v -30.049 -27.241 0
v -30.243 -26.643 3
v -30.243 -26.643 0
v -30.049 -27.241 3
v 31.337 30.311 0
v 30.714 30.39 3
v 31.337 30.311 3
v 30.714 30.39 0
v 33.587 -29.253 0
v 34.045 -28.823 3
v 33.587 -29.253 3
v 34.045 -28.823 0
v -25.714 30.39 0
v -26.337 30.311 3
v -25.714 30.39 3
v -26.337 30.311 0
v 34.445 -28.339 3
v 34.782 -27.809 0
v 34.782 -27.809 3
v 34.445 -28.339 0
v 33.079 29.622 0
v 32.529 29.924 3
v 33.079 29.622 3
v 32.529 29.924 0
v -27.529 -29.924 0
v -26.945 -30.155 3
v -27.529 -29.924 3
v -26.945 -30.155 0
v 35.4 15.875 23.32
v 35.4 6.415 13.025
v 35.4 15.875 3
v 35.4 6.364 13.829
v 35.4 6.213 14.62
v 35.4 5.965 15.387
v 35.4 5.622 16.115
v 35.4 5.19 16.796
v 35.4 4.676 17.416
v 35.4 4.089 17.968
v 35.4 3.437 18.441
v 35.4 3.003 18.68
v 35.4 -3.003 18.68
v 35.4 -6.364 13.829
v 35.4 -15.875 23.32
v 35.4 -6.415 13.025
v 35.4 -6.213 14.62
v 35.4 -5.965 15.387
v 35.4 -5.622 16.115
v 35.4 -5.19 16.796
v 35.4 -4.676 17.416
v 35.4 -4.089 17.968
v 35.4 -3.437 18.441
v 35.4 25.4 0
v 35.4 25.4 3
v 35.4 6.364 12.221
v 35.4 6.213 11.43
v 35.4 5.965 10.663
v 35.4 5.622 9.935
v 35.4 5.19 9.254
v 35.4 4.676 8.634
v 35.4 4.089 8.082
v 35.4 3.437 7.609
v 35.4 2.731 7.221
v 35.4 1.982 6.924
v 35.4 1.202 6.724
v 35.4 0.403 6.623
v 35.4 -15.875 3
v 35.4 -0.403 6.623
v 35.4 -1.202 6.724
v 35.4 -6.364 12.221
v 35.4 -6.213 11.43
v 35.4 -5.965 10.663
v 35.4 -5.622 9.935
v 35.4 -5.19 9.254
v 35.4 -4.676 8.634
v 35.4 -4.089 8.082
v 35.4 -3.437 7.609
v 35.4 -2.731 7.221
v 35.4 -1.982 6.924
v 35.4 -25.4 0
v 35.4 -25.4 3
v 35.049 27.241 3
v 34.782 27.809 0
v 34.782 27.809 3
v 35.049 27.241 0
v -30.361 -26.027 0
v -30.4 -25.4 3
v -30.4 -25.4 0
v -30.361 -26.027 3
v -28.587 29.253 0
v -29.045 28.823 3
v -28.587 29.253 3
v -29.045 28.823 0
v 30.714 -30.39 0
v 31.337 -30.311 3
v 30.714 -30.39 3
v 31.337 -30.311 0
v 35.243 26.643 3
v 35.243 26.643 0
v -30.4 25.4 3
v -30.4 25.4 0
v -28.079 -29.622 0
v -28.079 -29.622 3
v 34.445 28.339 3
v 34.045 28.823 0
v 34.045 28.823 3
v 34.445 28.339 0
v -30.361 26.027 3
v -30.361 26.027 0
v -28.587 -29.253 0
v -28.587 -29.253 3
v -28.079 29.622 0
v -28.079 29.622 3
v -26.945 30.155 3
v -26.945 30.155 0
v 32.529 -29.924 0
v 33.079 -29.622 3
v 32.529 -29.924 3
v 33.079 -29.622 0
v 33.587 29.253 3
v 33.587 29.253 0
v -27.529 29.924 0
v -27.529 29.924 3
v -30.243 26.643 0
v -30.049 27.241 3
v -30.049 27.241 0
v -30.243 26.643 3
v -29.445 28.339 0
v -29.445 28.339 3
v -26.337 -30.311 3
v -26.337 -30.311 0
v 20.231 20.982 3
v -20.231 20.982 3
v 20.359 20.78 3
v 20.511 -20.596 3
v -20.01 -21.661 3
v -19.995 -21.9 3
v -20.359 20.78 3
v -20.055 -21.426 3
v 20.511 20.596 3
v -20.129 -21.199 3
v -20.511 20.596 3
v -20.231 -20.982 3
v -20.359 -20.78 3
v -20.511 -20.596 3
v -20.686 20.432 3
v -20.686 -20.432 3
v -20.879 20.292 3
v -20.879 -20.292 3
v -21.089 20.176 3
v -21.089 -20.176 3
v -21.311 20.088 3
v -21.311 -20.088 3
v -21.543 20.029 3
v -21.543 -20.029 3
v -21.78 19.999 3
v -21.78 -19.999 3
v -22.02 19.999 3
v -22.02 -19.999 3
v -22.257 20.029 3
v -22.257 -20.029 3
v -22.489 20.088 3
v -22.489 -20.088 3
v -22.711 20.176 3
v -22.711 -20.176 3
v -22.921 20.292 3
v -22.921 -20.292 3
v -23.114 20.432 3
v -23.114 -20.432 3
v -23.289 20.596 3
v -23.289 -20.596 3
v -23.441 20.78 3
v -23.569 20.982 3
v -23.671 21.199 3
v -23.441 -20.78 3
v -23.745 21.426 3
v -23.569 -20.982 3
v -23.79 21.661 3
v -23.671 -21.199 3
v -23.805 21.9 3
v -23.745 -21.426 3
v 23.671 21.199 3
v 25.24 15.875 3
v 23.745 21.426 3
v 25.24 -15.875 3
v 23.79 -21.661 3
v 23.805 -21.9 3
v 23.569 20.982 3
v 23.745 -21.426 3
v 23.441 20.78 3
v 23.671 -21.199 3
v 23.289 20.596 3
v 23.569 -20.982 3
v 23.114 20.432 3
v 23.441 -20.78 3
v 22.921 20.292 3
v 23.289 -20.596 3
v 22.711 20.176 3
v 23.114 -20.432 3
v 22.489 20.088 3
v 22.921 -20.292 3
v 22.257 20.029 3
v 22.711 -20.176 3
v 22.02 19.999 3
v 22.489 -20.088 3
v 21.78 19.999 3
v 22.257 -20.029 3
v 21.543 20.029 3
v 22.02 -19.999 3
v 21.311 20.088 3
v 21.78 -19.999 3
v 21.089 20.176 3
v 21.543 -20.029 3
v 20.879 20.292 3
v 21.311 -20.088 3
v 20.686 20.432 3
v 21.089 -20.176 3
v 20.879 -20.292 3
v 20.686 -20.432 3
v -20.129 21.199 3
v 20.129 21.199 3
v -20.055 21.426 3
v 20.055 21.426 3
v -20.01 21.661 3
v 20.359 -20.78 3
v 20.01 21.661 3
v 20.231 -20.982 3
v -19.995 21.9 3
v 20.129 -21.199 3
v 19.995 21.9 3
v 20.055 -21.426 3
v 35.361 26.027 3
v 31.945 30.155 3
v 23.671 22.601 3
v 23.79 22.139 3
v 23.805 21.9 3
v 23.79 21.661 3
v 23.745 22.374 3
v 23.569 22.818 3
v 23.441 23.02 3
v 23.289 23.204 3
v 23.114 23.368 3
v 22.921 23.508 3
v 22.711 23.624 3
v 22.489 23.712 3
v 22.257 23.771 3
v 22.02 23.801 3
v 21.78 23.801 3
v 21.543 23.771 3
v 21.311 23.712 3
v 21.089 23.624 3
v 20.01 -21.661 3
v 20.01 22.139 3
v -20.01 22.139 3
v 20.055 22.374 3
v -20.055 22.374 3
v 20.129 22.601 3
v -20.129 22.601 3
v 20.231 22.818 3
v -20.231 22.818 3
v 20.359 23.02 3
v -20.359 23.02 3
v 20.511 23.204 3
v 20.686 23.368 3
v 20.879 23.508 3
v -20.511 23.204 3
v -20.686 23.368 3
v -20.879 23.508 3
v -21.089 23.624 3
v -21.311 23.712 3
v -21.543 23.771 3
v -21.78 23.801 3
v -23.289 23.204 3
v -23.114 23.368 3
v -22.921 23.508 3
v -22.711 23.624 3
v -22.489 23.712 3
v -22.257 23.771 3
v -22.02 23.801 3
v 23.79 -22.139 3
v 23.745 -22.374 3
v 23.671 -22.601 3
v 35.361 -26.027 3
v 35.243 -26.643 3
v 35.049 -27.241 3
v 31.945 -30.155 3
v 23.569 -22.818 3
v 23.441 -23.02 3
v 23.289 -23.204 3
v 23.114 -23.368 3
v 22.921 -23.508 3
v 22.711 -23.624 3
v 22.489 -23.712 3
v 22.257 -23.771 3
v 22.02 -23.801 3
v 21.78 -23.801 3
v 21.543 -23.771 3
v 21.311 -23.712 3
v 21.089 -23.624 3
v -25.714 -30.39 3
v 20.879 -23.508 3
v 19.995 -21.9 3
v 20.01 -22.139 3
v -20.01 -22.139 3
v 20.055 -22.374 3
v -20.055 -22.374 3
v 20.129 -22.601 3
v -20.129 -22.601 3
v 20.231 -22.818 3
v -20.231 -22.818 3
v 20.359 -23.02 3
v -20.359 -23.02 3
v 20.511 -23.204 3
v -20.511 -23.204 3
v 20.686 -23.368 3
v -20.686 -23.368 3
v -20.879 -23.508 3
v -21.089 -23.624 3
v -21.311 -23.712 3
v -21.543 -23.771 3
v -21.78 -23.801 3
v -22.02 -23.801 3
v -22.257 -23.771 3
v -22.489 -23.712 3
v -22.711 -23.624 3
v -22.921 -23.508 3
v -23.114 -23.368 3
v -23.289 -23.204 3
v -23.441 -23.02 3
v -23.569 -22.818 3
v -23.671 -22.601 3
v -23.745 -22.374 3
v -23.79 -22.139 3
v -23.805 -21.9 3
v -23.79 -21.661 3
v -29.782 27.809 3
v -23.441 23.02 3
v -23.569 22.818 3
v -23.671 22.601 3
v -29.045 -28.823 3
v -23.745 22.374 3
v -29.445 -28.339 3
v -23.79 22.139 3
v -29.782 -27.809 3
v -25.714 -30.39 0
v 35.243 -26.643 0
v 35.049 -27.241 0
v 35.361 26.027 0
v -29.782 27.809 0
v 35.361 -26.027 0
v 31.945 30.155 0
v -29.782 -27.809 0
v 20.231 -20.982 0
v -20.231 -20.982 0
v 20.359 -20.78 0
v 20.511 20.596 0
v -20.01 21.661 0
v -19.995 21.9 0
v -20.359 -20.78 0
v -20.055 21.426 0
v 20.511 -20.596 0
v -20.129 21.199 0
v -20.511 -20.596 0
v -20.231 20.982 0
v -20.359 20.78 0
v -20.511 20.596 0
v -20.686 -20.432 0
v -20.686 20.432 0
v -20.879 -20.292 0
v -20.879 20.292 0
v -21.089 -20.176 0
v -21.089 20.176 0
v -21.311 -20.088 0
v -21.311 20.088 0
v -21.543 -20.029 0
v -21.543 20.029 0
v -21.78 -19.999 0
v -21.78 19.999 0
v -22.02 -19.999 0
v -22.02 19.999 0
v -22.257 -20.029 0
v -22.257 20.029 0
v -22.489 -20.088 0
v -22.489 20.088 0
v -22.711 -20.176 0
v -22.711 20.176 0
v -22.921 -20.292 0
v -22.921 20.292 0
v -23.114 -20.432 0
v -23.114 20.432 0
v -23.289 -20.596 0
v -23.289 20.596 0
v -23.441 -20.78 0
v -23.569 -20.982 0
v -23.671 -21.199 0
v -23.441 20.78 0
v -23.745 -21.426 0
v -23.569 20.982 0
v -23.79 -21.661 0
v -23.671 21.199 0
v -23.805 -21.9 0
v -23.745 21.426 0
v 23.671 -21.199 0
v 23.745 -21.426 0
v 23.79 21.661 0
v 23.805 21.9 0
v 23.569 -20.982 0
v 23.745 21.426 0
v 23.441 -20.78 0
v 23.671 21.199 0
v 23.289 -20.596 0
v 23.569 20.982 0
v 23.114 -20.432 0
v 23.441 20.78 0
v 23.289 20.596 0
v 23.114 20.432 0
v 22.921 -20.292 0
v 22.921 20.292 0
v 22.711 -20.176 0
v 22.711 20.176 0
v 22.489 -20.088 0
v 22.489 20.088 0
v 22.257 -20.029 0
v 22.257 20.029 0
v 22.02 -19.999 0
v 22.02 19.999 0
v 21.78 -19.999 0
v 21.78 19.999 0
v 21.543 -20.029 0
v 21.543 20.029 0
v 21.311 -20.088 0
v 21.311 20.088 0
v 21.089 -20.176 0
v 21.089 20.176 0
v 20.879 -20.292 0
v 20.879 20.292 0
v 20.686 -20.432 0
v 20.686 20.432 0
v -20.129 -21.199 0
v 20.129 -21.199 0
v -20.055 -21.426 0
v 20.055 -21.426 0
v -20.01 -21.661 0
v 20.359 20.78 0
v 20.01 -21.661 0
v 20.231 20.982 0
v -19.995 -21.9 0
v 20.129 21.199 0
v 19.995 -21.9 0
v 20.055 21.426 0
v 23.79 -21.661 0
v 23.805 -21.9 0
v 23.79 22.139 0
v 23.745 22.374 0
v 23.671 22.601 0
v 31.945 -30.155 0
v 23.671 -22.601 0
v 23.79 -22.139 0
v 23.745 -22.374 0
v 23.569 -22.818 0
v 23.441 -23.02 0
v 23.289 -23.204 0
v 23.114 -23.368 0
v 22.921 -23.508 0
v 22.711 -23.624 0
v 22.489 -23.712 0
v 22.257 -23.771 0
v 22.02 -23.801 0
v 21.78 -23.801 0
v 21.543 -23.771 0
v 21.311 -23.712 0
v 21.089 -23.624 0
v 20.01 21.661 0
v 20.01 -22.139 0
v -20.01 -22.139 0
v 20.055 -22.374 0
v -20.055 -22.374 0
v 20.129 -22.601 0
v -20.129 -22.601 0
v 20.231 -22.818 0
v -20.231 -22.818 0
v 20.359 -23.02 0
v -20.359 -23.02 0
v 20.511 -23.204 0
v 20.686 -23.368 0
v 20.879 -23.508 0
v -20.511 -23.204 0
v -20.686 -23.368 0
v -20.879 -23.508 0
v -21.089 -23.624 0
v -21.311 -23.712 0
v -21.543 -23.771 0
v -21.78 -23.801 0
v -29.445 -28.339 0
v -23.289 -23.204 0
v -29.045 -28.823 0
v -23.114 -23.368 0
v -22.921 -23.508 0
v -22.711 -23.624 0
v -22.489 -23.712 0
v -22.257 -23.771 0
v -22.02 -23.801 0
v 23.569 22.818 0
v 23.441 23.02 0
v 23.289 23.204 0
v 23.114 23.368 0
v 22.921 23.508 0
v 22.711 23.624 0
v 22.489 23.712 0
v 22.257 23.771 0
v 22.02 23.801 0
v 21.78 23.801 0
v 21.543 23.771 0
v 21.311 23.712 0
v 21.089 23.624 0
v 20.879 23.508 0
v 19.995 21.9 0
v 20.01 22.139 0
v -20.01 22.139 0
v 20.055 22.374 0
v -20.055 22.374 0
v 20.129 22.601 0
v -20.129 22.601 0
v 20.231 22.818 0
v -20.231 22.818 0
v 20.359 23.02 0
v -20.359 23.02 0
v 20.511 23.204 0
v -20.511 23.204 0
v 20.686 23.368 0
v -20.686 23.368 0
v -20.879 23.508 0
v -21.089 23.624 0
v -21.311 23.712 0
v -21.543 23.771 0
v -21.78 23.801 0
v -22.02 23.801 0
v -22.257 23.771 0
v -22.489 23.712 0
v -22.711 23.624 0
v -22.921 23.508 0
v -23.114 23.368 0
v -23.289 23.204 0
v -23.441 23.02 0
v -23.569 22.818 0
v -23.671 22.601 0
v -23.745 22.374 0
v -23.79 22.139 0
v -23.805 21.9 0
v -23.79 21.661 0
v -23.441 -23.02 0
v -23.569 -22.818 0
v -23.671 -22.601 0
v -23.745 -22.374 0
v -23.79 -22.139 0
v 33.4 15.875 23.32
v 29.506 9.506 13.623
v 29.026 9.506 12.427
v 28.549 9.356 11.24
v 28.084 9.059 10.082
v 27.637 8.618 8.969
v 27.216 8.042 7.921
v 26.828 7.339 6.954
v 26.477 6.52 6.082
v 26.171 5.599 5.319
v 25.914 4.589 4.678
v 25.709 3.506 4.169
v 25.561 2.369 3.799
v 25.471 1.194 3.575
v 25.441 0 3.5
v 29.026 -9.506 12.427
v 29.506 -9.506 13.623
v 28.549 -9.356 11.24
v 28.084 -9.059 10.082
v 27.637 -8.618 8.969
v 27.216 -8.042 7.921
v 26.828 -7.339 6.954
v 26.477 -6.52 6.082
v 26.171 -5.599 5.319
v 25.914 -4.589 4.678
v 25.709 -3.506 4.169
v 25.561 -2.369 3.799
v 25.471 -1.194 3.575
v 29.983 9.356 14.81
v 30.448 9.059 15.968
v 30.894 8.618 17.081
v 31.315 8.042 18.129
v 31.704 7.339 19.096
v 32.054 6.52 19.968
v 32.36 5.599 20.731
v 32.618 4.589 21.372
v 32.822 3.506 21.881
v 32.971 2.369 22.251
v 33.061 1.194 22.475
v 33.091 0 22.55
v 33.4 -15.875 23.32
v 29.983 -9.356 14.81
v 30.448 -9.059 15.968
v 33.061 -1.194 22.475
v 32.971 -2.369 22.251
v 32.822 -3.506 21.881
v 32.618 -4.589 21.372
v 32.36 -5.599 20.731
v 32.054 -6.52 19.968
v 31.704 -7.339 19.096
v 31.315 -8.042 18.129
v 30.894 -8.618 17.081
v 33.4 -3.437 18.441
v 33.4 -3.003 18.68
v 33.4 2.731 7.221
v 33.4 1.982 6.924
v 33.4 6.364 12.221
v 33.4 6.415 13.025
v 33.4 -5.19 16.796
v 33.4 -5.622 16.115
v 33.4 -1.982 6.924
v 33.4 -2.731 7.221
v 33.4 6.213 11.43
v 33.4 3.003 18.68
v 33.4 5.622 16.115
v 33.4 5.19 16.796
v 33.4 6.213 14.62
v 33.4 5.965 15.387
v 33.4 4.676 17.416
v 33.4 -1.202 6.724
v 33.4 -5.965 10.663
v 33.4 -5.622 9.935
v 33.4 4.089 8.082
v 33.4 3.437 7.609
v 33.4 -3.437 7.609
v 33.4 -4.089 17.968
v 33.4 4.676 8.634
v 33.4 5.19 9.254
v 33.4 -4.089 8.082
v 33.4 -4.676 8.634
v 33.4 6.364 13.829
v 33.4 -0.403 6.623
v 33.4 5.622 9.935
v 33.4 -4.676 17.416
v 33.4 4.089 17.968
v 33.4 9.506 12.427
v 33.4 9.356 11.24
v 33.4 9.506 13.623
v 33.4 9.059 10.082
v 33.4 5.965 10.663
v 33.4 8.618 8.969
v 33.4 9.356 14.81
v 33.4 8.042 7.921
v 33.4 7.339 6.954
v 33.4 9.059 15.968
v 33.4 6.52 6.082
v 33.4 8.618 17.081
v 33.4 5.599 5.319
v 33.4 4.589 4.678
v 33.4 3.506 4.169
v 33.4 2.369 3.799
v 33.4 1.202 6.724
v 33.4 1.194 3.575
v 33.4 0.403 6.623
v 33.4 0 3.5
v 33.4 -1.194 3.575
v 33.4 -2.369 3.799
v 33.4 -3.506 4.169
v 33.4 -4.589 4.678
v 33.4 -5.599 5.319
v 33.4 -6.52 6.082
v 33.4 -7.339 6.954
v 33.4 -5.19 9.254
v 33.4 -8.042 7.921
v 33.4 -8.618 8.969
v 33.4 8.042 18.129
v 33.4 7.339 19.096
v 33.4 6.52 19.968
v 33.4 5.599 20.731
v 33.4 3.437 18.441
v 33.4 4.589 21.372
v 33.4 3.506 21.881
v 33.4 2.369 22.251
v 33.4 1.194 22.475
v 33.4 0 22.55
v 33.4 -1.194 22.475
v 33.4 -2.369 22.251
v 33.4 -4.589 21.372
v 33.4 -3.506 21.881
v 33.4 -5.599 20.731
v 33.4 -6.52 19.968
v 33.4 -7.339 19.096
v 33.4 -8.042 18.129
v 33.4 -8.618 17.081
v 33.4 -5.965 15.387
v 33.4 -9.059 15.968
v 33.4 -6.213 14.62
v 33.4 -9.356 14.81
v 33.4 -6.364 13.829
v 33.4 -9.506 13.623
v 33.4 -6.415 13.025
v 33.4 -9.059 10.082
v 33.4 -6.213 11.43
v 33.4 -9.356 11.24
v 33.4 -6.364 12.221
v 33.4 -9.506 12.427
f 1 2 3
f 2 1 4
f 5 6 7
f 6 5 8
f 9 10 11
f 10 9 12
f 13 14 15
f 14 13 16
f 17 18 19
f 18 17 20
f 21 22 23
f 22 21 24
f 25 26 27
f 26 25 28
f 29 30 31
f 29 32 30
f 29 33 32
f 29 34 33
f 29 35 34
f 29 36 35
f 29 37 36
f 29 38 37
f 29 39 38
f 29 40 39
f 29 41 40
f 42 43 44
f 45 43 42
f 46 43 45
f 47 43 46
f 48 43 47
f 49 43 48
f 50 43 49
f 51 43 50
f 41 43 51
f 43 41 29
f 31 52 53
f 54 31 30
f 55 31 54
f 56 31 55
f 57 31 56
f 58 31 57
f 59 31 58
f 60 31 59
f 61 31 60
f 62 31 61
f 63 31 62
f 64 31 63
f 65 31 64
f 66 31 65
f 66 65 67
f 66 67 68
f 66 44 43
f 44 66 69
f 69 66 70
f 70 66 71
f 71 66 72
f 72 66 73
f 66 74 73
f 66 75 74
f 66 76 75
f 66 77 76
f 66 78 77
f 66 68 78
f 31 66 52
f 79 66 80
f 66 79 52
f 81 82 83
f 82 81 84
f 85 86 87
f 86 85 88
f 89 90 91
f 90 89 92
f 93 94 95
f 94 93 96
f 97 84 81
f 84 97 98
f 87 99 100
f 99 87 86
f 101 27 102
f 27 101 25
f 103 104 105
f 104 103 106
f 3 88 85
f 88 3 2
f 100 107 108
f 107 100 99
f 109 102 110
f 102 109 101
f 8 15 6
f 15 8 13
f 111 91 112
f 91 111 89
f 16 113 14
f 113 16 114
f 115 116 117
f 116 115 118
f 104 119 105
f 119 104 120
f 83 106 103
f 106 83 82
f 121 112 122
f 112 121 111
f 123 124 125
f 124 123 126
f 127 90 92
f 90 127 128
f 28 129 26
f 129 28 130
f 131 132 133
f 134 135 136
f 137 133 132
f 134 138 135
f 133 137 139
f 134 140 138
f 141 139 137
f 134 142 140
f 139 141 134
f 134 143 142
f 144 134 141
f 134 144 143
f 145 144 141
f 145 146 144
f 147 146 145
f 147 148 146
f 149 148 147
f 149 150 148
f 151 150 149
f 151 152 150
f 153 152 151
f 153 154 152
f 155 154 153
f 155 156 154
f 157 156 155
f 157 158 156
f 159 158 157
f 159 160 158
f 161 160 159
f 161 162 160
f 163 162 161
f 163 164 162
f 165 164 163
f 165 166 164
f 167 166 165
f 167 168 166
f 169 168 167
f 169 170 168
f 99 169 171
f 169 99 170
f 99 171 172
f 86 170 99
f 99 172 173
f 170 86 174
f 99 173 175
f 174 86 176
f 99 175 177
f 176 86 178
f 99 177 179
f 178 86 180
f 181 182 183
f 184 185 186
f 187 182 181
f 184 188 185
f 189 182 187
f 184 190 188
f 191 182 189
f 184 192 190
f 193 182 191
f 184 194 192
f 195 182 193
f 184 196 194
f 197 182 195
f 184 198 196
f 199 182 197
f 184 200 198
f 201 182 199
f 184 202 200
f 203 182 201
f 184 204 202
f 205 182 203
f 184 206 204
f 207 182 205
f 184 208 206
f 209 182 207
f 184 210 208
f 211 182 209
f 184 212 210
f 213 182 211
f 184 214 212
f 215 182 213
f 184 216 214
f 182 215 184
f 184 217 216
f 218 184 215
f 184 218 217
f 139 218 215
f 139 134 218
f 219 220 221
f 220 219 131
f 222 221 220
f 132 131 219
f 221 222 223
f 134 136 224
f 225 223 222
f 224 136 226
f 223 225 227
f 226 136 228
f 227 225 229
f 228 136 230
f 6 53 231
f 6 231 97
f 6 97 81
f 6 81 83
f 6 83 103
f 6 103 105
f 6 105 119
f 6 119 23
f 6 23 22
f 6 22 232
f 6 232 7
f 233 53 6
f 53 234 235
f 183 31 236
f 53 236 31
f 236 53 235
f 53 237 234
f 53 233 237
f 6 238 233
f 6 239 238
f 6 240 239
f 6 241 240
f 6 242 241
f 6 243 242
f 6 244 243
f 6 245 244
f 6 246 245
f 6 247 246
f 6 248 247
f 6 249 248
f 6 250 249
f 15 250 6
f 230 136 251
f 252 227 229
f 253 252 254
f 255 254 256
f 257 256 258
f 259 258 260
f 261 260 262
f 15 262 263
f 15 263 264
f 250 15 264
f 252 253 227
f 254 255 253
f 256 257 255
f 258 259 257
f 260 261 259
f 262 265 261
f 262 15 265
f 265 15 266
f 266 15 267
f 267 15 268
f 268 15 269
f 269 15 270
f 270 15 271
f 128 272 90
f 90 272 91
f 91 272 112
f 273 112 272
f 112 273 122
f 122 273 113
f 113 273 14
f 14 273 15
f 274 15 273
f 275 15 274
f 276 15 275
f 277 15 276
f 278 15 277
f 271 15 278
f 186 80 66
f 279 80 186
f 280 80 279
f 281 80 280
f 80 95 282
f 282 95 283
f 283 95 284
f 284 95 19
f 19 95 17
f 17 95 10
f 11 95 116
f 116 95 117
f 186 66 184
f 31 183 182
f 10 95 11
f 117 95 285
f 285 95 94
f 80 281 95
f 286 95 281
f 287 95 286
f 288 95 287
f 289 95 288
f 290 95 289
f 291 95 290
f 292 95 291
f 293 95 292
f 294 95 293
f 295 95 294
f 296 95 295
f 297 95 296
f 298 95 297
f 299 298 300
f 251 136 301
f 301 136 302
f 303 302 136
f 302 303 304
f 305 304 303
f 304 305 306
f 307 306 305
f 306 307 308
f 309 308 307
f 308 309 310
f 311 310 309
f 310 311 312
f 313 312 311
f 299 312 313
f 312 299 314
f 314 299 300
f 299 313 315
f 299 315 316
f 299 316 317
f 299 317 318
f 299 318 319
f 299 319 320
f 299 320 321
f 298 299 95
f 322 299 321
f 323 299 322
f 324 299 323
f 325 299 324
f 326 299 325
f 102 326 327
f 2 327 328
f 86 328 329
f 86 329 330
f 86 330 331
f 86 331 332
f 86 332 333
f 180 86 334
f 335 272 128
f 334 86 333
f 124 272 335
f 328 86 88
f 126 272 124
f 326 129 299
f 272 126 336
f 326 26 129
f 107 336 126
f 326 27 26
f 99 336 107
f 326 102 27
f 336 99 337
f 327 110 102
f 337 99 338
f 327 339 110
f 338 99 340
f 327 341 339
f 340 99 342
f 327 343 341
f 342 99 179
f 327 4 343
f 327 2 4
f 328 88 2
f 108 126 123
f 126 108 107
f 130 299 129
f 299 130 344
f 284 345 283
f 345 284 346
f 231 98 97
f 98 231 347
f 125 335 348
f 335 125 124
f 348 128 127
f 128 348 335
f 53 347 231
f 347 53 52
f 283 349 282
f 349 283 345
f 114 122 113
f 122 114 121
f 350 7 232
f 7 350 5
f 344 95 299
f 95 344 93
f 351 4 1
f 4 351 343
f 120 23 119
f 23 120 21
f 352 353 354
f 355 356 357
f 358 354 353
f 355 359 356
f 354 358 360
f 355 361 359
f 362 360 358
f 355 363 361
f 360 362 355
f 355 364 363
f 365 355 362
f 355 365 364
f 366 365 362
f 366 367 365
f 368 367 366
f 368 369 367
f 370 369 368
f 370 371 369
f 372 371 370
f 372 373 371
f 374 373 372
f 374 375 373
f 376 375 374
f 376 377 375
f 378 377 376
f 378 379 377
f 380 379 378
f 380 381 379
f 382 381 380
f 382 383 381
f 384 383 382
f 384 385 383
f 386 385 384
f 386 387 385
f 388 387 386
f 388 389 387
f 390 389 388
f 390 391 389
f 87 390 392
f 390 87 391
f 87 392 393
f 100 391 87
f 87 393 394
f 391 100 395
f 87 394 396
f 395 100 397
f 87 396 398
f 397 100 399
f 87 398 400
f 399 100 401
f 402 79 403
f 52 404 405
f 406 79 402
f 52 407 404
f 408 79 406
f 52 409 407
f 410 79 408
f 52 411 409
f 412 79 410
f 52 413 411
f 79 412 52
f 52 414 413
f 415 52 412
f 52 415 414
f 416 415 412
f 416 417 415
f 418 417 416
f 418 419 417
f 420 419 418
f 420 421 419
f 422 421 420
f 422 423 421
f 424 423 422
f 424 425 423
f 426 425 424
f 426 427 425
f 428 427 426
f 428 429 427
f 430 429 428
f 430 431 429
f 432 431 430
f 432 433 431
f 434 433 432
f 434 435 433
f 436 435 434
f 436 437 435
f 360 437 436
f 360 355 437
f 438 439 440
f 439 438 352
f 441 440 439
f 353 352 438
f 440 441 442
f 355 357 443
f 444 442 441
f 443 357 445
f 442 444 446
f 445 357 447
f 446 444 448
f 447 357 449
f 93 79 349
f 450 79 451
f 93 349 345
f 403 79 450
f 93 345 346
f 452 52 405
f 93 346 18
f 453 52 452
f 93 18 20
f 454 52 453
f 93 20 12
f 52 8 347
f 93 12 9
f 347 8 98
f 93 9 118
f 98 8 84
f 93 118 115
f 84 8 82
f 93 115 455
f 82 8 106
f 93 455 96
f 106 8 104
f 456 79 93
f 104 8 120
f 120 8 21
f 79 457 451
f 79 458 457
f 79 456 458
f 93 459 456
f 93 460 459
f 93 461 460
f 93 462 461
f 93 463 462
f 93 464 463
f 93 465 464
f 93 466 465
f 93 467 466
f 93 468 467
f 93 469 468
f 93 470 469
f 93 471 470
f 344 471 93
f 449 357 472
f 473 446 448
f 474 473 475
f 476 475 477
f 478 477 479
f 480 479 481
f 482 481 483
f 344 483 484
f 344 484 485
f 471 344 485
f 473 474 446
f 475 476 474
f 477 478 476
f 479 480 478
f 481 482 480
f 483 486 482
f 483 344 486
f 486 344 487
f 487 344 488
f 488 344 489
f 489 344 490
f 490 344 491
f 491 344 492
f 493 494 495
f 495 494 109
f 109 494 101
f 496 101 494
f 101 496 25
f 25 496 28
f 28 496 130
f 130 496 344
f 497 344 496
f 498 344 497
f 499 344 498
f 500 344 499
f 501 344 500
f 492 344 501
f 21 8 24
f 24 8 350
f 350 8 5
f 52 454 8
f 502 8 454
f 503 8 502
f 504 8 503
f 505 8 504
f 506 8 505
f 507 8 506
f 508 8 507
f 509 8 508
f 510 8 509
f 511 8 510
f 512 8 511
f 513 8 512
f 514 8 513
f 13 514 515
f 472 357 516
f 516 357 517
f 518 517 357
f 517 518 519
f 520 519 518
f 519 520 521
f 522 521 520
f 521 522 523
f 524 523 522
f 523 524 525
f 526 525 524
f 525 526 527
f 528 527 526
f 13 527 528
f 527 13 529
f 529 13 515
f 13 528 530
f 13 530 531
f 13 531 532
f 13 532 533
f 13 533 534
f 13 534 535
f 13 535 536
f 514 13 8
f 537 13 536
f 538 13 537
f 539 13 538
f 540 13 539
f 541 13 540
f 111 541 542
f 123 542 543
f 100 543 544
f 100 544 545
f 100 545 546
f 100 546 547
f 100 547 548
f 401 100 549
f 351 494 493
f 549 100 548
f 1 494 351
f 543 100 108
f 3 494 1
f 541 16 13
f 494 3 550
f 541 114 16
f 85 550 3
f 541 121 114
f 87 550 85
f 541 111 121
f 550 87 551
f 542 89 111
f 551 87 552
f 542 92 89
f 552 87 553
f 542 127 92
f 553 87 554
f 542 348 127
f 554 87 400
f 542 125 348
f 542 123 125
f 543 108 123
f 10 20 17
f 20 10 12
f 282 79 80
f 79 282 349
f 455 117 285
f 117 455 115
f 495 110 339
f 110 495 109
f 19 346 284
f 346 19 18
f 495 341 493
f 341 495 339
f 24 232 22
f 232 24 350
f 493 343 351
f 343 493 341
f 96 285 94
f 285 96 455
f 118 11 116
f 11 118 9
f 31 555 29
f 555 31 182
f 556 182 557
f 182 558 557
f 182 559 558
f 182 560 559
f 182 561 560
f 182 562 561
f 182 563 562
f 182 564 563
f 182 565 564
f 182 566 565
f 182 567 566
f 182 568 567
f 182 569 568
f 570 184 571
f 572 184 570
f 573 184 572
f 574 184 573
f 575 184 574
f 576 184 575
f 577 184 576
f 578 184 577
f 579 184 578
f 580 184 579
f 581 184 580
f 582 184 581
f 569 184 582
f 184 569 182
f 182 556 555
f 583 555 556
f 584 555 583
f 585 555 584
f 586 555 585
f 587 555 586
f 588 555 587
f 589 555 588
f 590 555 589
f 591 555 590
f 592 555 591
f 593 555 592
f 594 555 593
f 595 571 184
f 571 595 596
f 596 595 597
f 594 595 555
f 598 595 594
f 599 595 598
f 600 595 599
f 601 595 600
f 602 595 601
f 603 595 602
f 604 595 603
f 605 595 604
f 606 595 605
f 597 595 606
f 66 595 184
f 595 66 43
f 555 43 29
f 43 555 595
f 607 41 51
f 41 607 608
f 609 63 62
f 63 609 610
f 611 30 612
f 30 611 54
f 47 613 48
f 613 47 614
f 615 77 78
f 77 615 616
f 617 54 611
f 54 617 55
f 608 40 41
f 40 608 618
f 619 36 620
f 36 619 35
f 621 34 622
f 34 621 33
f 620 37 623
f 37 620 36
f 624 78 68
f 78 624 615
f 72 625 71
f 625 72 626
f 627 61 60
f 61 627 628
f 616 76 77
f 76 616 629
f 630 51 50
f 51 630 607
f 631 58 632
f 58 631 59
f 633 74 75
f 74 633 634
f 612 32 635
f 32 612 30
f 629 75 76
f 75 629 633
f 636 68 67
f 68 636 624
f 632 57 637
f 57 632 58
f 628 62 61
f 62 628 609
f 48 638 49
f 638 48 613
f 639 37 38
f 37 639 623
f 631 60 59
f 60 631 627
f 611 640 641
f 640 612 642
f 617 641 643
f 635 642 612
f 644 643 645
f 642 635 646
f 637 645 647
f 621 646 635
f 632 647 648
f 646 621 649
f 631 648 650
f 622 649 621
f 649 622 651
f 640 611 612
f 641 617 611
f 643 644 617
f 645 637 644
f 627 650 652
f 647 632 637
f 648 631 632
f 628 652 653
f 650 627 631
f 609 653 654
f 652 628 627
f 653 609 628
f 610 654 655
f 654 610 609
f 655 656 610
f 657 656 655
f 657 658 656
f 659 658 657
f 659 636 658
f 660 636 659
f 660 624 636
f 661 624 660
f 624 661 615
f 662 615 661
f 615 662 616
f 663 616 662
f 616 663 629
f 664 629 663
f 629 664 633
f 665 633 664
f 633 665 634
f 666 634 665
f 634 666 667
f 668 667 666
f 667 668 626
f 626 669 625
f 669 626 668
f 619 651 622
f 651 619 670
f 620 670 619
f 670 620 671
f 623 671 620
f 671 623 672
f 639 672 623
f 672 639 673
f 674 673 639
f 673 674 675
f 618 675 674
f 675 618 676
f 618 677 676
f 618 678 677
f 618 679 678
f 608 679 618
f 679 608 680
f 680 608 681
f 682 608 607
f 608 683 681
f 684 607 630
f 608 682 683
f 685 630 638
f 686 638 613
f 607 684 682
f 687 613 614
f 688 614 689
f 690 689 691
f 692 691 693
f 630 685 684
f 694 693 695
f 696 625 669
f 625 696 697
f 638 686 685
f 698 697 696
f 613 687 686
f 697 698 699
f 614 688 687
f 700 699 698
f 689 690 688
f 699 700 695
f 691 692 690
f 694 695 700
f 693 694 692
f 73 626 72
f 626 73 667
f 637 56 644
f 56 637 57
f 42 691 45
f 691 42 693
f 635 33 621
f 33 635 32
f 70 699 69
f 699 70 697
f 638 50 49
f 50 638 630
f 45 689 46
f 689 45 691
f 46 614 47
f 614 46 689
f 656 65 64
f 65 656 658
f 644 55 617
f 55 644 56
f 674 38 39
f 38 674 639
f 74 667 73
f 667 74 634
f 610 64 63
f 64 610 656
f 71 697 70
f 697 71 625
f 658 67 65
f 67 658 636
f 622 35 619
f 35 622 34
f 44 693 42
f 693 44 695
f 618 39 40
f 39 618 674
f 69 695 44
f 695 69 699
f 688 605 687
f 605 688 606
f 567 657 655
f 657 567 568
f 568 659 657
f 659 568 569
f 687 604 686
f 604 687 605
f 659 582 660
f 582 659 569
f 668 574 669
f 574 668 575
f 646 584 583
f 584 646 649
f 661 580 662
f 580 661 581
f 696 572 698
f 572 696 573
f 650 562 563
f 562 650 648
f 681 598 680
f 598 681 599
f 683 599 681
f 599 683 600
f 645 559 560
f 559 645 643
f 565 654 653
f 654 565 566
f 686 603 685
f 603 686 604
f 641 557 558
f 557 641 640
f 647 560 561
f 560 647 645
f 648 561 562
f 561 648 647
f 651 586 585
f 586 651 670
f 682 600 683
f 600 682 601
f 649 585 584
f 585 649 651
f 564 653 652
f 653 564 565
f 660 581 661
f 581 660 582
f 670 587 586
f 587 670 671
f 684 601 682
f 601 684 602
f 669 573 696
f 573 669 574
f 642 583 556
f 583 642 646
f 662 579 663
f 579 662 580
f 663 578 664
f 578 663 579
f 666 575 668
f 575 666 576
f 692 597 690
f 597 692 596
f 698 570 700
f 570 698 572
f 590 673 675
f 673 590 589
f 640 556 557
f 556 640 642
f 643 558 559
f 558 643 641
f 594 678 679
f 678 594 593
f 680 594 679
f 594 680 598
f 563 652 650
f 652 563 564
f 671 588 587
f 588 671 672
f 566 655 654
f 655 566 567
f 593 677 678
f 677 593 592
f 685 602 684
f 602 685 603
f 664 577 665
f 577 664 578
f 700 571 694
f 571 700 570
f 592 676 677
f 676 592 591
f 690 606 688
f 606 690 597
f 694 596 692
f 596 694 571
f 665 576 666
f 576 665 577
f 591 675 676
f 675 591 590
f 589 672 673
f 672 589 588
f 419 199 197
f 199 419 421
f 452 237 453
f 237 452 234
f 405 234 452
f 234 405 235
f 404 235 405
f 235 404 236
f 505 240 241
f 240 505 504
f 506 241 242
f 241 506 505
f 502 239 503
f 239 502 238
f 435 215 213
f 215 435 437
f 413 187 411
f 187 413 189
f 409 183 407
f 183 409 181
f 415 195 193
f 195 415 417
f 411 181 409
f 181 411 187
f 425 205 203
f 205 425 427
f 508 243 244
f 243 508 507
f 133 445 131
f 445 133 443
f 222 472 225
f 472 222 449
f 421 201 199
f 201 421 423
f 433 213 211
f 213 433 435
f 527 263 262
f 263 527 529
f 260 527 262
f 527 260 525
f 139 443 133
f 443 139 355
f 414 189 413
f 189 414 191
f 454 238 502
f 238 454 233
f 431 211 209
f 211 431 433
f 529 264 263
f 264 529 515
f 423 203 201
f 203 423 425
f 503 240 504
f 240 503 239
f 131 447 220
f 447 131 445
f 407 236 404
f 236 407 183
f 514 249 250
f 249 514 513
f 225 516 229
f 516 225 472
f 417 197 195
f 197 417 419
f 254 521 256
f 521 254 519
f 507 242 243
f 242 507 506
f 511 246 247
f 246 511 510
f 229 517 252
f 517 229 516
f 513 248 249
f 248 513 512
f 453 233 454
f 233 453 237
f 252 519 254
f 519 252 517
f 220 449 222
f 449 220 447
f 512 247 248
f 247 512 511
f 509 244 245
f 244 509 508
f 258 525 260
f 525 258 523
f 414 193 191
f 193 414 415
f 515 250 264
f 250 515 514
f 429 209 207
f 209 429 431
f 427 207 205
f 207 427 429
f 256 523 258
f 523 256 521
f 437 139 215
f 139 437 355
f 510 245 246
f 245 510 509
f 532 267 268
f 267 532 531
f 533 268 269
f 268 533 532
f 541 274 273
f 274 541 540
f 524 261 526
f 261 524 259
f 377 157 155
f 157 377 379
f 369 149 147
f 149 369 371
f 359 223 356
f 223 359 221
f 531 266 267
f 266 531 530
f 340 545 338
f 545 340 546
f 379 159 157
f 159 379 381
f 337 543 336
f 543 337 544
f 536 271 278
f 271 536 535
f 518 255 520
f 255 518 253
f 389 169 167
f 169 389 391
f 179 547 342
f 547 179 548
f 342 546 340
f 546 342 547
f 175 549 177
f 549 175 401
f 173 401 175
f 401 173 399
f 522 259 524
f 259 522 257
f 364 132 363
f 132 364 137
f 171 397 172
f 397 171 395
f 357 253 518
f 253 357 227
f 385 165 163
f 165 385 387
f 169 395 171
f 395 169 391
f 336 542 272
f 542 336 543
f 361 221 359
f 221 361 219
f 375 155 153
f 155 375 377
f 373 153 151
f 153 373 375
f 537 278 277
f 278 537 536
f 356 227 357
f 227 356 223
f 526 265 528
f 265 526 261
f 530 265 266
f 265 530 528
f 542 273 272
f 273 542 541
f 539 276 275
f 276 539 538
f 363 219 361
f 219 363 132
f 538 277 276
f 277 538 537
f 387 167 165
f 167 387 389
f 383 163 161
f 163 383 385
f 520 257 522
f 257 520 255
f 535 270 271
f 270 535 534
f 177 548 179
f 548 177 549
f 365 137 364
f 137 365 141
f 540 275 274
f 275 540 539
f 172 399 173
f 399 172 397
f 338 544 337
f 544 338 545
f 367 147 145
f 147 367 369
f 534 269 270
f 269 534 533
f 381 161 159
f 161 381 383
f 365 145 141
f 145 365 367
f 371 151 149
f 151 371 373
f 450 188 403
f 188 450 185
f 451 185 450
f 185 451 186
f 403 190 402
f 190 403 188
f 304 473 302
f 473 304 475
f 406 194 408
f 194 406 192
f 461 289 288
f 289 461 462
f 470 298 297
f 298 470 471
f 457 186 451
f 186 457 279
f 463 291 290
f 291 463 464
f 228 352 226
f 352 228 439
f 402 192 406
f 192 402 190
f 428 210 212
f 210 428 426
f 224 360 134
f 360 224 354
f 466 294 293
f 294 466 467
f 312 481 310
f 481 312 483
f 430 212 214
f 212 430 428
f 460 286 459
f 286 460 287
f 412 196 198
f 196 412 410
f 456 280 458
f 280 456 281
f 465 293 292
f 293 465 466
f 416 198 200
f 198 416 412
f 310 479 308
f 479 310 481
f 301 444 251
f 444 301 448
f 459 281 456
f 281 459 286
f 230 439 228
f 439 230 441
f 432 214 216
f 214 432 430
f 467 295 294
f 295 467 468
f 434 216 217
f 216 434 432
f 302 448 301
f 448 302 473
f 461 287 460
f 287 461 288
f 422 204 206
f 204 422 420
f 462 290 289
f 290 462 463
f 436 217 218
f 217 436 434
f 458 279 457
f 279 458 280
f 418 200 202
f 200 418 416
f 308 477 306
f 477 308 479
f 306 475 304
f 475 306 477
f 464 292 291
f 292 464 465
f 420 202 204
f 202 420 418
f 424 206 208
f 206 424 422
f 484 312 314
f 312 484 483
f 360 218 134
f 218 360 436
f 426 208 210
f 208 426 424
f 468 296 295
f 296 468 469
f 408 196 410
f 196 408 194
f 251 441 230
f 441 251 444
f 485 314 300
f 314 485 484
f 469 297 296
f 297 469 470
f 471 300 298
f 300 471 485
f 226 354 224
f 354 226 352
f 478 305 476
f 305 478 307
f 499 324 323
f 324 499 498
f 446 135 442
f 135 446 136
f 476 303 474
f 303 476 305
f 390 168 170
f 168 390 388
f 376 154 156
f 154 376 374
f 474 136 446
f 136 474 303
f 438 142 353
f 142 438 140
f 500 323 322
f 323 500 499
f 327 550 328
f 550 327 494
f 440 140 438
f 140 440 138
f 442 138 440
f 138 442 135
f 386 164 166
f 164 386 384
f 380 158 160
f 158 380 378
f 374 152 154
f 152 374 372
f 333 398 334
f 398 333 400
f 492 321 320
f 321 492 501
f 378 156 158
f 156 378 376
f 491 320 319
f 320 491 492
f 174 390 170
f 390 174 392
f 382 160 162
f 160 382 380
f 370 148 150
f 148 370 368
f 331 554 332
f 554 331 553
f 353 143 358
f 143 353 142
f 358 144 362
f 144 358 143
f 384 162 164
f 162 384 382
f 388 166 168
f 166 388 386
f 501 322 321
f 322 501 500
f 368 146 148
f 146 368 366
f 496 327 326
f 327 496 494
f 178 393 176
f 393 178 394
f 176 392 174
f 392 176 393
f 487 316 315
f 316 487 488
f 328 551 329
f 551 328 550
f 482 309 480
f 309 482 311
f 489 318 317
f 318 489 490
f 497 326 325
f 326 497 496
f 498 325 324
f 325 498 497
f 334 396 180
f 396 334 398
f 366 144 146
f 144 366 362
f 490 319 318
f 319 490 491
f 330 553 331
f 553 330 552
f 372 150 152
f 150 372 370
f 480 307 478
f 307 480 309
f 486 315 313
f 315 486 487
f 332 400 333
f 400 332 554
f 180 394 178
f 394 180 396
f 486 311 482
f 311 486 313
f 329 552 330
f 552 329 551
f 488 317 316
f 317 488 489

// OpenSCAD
$fn=50;
inch = 25.4;

// center to center dimensions
mw = 2*inch + 10;  // mounting width
mh = 2*inch + 10;  // mounting width
bw = 43.8;  // board width
bh = 43.8;  // board height
z = 3; // board thickness

br = [0.8*inch, 1.25*inch, 2];  // bracket size

offset = 5; // offset side to fit din mount

// hole diameters
md = 0.28*inch;  // mounting hole diameter
bd = 0.15*inch;  // board hole diameter

module roundedRect(size, radius) {
  x = size[0];
  y = size[1];
  z = size[2];
  linear_extrude(height=z)
  hull() {
    // place 4 circles in the corners, with the given radius
    translate([(-x/2)+radius, (-y/2)+radius, 0])
    circle(r=radius);
    translate([(x/2)-radius+offset, (-y/2)+radius, 0])
    circle(r=radius);
    translate([(-x/2) + radius, (y/2)-radius, 0])
    circle(r=radius);
    translate([(x/2)-radius+offset, (y/2)-radius, 0])
    circle(r=radius);
  }
}

module mini_din(thickness, rot) {
  linear_extrude(thickness, true)
  rotate([0, 0, rot])
  intersection(){
    circle(r=12.83/2);
    translate([-12.83/2,-12.83/2 + (12.83-12.07), 0])
    square([12.83, 12.07], false);
  }    
}

module counterSunk(position, radius) {
  union() {
    translate(position)
    union() {
      cylinder(3, radius, radius, 8, center=false);
      cylinder(3, 0, 3.5, center=false);
    }
  }
}

// plate itself
difference() {
  // positive rectangle
  union(){
    roundedRect([mw, mh, z], 5);
    translate([mw/2+offset, 0, z])
    rotate([90, 0, 0])
    linear_extrude(height=br[1], center=true)
    polygon([[0,0], [-br[0]/2,0], [-br[2], br[0]],[0, br[0]]]);
  };
  // bracket for power in
  translate([mw/2+5, 0, z+3/8*inch])
  rotate([0, 90, 0])
  translate([-0.5, 0, -br[2]])
  union(){
    mini_din(br[2]*10, -90);
    translate([0,0, -20-br[2]])
    cylinder(r=3/8*inch, h=22, center=false);
  }
  // four board holes
  translate([bw/2, bh/2, 0])
  cylinder(3, bd/2, bd/2);
  translate([-bw/2, bh/2, 0])
  cylinder(3, bd/2, bd/2);
  translate([bw/2, -bh/2, 0])
  cylinder(3, bd/2, bd/2);
  translate([-bw/2, -bh/2, 0])
  cylinder(3, bd/2, bd/2);
}
